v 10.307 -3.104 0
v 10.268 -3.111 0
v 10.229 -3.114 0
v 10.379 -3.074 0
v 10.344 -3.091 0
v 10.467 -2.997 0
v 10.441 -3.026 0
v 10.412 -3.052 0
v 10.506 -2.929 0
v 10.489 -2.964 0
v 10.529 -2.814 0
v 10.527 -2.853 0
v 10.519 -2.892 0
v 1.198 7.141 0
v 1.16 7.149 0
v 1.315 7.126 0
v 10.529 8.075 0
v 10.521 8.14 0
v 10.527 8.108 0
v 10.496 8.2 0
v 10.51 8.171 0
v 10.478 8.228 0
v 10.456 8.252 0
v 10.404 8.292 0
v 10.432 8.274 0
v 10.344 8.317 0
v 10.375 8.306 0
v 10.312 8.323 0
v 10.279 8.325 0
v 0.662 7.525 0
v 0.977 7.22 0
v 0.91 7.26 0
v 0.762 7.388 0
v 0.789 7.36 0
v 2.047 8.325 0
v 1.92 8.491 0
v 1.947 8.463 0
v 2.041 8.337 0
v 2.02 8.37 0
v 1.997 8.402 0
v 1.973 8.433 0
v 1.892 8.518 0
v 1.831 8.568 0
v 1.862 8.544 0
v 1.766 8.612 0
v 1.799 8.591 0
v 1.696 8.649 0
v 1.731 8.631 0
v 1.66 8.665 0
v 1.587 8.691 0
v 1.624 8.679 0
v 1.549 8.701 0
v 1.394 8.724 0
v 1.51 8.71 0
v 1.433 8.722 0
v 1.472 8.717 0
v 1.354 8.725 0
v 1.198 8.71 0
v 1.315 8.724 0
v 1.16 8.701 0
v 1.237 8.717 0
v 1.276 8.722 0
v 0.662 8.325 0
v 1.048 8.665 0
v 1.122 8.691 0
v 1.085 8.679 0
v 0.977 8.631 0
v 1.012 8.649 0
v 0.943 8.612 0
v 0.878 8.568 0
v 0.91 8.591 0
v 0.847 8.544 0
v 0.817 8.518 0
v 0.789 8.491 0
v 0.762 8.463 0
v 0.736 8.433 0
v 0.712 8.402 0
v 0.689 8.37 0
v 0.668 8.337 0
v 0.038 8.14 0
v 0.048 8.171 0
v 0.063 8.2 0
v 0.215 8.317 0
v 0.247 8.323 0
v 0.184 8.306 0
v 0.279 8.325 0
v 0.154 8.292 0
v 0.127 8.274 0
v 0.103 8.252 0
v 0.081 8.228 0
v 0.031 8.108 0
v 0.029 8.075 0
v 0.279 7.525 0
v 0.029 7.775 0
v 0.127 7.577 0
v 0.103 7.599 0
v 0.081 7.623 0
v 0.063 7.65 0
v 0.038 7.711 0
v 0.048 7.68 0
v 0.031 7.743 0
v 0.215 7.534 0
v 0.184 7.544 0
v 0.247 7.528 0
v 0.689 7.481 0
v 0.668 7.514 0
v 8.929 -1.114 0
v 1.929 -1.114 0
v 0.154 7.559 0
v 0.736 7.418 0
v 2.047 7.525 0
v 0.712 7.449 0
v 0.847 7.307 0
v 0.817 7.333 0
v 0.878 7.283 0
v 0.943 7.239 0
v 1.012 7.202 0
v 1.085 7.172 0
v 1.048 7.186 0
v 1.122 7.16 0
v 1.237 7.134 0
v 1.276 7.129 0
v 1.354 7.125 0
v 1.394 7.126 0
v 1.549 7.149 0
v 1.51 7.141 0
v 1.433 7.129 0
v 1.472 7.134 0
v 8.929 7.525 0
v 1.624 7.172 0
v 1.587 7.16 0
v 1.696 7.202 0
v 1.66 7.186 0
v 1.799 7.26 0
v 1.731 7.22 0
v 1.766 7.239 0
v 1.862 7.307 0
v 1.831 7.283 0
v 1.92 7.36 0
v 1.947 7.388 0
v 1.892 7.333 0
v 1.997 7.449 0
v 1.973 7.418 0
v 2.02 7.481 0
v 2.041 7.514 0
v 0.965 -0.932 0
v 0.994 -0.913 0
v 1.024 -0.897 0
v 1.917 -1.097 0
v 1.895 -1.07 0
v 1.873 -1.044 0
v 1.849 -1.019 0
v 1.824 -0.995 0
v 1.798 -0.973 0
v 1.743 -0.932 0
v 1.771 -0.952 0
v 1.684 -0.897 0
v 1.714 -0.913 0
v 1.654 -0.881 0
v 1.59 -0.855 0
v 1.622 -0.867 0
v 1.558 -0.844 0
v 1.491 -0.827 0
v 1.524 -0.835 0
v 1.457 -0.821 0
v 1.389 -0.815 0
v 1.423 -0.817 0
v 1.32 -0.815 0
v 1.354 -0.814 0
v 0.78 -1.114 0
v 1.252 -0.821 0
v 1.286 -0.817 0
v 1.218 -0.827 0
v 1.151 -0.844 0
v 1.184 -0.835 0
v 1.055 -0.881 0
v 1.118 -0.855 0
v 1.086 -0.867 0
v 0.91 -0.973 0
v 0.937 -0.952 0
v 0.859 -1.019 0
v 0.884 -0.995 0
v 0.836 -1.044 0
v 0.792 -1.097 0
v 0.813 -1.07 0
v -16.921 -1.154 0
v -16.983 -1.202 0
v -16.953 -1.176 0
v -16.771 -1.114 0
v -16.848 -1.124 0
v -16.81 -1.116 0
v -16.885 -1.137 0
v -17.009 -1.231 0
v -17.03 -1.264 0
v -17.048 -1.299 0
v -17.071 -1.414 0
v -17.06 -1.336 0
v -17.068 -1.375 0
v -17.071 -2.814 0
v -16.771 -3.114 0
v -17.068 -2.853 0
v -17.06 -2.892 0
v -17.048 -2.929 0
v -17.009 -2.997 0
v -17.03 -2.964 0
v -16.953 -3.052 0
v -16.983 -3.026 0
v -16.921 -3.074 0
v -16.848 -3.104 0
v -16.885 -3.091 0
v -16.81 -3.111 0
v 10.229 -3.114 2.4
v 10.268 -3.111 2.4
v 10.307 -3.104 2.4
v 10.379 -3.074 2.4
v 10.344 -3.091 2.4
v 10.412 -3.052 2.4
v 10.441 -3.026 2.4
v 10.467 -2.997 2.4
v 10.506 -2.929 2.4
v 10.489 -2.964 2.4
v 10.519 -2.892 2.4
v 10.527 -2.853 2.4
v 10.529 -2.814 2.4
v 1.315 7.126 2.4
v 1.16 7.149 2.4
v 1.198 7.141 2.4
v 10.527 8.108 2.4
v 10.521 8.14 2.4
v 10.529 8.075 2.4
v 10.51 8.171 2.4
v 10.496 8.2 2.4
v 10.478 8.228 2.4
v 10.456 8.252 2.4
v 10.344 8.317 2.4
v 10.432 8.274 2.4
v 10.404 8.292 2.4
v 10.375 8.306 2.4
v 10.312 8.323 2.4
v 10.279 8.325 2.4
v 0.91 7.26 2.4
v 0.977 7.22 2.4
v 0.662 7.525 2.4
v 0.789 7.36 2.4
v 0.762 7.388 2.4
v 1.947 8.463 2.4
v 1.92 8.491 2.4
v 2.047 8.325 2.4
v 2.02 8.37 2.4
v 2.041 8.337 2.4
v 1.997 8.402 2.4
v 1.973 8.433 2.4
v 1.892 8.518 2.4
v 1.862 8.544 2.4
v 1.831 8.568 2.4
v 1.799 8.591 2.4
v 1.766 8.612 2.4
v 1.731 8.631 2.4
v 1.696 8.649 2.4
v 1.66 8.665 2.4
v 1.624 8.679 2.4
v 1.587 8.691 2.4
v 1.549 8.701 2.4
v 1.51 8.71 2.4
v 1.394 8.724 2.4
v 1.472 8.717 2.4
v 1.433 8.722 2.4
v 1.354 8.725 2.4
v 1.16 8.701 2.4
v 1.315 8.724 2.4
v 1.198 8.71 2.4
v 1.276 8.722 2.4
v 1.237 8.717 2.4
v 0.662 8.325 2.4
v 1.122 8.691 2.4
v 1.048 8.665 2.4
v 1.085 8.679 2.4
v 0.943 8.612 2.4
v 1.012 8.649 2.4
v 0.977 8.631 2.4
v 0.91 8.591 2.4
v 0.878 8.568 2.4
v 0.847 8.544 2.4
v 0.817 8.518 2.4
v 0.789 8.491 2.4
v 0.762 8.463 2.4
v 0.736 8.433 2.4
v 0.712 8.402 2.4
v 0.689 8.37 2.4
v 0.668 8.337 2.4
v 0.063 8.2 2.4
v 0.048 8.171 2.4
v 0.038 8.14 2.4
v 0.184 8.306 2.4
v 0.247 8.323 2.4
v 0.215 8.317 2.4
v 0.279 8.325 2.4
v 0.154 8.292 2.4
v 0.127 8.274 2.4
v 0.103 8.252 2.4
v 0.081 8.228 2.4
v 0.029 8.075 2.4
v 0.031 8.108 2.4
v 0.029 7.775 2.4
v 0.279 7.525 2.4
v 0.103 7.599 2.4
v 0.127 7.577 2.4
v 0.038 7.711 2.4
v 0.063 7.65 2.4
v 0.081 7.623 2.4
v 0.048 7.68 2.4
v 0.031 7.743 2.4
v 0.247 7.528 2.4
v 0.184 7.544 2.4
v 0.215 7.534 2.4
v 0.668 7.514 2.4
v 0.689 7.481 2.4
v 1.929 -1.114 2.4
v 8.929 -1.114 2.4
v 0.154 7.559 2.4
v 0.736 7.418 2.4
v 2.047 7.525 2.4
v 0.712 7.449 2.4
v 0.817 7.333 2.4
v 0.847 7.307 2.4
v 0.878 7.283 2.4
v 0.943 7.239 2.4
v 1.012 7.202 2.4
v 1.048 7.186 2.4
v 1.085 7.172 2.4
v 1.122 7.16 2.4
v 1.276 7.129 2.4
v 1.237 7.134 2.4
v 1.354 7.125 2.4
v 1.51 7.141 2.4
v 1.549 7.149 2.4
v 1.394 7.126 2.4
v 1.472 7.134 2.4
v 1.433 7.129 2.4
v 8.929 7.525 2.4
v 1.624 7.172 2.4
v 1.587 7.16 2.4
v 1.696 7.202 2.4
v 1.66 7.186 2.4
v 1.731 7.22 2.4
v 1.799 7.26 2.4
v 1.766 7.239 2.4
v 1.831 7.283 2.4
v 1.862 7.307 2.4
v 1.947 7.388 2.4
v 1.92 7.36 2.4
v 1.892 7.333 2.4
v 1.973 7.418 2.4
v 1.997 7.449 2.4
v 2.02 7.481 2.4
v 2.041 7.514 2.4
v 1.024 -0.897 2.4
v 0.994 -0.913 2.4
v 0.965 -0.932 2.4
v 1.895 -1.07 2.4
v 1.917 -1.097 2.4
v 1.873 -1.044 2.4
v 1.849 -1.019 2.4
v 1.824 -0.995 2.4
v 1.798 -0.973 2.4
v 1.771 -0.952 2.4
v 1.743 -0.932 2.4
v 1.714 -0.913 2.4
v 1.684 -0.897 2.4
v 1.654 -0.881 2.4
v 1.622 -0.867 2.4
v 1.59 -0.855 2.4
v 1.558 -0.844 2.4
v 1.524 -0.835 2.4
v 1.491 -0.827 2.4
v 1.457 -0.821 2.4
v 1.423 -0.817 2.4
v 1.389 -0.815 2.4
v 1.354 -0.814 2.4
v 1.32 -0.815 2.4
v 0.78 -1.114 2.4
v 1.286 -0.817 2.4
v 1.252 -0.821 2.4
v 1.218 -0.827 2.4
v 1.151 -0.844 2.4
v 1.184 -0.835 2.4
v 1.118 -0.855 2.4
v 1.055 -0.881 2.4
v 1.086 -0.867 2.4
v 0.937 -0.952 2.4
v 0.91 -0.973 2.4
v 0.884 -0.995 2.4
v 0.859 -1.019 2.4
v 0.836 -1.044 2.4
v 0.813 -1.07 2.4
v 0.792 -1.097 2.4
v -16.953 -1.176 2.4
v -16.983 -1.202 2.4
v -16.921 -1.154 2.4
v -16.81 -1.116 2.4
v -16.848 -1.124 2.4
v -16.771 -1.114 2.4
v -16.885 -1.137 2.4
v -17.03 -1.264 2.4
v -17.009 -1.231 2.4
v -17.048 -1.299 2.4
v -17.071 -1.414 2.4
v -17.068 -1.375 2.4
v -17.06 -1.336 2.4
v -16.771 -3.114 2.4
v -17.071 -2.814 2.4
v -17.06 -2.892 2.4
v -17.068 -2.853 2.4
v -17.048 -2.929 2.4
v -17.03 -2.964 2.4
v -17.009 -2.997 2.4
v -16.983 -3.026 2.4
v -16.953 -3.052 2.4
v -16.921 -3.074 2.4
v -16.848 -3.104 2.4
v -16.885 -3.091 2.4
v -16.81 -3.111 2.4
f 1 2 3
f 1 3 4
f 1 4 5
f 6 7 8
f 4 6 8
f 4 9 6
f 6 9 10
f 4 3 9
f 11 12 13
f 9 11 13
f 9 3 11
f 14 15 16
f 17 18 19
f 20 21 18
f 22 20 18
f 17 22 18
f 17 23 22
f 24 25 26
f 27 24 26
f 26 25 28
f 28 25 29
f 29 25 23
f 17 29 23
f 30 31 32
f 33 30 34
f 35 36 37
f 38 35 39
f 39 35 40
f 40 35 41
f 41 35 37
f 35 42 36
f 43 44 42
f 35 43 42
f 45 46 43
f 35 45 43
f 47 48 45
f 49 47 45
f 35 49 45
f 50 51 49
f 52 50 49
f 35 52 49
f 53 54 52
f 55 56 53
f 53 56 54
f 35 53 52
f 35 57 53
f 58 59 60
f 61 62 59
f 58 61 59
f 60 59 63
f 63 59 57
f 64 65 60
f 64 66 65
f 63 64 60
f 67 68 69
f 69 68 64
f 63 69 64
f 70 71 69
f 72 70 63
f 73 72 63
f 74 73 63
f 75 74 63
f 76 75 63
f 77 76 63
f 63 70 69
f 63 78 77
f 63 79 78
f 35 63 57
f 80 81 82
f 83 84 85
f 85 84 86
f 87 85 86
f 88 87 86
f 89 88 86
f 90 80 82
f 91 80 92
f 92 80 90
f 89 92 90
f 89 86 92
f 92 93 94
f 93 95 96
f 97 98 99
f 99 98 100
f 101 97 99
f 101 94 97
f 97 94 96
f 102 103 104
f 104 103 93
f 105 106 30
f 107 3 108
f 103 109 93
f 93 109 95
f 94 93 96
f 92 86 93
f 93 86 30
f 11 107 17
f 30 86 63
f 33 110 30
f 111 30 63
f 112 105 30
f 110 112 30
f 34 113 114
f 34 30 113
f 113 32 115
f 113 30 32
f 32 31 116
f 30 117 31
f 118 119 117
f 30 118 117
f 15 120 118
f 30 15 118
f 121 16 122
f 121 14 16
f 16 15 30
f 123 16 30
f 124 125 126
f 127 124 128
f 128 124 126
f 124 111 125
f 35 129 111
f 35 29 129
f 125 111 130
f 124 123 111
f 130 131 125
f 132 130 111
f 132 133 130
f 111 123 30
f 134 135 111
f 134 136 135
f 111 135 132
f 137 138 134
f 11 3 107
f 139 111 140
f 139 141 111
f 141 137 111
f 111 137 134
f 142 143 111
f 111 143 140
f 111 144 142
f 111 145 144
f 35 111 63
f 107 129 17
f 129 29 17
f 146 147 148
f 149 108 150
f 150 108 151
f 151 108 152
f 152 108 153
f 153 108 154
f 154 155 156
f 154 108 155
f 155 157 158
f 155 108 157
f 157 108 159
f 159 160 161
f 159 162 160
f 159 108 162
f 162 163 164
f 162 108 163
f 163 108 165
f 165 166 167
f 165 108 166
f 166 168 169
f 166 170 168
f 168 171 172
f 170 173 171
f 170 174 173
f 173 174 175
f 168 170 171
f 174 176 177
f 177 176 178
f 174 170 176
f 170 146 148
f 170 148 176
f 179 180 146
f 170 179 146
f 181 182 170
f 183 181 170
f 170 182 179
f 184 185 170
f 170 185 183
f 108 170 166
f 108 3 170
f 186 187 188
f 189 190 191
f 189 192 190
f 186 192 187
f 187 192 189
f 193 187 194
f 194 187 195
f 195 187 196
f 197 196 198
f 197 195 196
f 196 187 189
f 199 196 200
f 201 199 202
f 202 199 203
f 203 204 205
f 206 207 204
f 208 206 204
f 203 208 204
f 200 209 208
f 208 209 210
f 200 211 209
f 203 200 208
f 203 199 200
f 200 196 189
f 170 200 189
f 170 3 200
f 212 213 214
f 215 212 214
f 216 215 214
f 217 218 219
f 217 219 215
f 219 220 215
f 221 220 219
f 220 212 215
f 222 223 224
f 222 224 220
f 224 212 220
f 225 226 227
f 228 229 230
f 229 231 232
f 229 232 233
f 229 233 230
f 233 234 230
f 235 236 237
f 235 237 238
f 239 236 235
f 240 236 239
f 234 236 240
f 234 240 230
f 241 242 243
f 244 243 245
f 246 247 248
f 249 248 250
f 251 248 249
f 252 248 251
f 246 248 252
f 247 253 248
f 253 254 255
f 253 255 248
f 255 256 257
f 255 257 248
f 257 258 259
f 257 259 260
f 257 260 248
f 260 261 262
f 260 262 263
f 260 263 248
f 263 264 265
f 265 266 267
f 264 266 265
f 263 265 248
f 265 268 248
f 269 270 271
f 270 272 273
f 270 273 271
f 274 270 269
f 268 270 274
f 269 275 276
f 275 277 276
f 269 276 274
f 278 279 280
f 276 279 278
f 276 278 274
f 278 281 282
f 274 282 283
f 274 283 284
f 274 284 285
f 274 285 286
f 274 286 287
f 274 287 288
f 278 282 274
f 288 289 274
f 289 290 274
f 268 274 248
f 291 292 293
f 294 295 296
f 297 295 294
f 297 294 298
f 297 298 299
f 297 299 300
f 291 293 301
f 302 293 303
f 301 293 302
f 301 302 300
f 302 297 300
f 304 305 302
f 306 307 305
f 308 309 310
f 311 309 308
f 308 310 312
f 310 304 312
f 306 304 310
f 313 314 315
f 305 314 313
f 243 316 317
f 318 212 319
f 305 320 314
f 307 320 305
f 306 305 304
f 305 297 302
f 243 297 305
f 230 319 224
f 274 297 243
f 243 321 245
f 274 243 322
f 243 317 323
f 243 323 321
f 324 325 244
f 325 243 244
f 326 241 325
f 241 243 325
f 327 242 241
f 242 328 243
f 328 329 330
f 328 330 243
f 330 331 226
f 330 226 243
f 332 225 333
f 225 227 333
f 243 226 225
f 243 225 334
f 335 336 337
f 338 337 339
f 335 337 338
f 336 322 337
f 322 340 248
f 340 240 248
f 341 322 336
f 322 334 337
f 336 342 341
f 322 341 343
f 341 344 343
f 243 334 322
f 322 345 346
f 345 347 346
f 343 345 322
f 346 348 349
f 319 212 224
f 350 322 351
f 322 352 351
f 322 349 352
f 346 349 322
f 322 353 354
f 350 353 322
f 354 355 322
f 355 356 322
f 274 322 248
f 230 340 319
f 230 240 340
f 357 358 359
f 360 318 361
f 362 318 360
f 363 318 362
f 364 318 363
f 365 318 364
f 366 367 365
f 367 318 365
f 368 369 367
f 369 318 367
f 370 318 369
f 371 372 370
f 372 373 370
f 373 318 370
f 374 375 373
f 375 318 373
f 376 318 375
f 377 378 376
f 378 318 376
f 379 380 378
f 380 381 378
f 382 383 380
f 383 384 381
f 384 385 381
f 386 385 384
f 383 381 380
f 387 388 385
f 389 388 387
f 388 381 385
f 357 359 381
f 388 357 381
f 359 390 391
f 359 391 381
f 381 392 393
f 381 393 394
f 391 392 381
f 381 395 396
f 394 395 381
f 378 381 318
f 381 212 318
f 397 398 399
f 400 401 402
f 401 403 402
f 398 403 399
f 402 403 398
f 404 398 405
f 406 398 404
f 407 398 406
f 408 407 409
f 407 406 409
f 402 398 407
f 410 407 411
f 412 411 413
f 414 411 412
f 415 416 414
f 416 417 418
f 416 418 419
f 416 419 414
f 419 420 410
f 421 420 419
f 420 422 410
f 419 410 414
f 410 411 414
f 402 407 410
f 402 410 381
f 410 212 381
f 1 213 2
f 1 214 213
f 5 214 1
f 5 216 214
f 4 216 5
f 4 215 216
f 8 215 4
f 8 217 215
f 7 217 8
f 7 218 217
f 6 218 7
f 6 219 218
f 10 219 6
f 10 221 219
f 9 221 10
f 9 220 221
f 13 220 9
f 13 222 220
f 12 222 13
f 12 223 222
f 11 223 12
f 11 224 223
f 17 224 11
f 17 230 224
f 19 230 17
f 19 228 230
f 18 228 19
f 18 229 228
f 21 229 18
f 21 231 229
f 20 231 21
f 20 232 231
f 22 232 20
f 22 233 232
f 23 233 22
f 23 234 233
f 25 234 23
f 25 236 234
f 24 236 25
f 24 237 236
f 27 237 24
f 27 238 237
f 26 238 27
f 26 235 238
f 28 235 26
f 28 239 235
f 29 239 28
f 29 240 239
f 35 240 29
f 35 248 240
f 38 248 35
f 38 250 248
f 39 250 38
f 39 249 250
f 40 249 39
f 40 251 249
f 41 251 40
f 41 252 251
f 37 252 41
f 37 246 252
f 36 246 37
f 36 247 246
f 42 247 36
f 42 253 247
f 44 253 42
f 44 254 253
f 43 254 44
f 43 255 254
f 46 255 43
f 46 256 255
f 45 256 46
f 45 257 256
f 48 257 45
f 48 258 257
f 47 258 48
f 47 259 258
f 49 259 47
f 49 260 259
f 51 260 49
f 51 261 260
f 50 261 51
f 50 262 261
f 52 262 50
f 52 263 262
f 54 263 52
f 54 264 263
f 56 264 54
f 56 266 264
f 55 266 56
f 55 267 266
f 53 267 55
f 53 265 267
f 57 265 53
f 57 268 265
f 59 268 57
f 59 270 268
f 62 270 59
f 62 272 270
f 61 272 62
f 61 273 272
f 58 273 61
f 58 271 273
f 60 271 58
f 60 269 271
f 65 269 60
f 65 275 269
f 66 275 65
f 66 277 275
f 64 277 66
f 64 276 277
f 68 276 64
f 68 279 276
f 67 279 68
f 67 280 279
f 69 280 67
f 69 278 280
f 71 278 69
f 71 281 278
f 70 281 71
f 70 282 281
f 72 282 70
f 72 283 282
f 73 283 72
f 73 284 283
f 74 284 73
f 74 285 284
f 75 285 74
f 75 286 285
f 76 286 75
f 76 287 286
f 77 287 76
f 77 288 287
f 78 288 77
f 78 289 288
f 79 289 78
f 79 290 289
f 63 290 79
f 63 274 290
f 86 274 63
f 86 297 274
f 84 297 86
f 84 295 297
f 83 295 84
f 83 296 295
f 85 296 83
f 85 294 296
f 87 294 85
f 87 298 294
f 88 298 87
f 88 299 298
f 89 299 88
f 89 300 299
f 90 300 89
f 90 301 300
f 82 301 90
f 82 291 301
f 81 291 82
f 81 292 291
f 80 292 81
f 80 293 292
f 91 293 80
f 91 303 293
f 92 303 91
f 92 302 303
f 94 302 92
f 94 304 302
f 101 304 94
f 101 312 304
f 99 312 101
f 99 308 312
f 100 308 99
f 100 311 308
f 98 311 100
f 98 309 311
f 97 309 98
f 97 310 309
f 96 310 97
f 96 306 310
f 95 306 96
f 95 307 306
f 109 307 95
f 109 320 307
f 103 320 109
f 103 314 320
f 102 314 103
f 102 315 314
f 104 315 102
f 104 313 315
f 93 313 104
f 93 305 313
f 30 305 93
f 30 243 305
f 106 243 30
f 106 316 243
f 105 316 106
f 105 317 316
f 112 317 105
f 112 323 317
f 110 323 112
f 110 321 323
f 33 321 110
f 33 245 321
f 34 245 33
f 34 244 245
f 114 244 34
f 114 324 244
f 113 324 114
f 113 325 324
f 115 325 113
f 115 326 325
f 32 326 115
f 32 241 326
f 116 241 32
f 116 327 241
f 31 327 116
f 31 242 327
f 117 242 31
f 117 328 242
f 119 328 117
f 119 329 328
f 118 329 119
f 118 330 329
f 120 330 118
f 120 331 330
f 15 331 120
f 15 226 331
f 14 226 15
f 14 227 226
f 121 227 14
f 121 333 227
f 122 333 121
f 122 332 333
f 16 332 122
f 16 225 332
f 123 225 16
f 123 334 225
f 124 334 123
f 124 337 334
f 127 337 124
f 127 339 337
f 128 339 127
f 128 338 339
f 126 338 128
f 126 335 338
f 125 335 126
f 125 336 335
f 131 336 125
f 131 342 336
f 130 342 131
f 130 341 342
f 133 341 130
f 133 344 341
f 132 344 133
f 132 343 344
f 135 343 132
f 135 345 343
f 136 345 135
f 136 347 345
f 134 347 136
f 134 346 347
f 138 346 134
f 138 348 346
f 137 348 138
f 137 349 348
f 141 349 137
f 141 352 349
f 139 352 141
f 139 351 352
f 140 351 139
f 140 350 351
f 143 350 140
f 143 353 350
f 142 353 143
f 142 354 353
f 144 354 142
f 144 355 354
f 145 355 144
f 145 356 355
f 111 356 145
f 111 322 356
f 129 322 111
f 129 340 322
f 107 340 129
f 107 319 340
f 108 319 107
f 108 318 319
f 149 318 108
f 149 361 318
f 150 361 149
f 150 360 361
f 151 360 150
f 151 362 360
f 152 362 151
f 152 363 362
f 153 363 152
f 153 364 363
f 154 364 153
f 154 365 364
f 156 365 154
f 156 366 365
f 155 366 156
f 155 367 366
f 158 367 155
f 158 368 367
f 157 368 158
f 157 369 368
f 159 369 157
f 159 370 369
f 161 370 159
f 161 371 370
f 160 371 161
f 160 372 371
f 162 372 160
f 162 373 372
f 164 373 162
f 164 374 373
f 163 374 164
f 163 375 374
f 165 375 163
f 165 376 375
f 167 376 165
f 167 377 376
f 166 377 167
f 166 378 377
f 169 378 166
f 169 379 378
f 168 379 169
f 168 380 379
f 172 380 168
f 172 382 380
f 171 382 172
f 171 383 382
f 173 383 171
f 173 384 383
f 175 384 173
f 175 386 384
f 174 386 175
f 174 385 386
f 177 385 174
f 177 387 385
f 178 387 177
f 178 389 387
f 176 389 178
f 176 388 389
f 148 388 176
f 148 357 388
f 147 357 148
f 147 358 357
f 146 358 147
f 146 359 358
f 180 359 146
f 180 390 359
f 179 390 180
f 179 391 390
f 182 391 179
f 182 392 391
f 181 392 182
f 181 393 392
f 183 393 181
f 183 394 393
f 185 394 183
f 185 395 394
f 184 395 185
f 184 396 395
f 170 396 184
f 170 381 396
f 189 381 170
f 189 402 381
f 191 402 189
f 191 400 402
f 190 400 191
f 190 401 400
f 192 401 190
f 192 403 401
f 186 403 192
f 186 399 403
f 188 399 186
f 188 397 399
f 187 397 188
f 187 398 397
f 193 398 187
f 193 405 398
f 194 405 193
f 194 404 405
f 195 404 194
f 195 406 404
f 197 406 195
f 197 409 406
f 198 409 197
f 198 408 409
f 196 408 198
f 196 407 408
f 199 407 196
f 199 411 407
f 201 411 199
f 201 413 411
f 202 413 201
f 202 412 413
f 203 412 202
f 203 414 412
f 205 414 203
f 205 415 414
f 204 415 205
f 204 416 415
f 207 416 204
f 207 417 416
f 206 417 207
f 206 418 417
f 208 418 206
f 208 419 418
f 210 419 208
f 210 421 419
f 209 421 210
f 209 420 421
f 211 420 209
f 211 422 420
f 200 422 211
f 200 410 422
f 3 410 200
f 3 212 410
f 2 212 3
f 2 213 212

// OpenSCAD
// Perfil C em PC. Imprimir deitado de lado: sem suportes.
// Rebaixo livre 0.15 mm menor que o conjunto nominal; folhas flexionam ao encaixar.
linear_extrude(height=2.4) polygon(points=[[-16.809825, -3.11135], [-16.770667, -3.113917], [9.279333, -3.113917], [10.179333, -3.113917], [10.229333, -3.113917], [10.26849, -3.11135], [10.306978, -3.103694], [10.344138, -3.091081], [10.379333, -3.073724], [10.411961, -3.051923], [10.441465, -3.026049], [10.467339, -2.996545], [10.48914, -2.963917], [10.506496, -2.928722], [10.51911, -2.891562], [10.526766, -2.853074], [10.529333, -2.813917], [10.529333, -2.763917], [10.529333, -1.413917], [10.529333, 7.775417], [10.529333, 7.975417], [10.529333, 8.075417], [10.527194, 8.108048], [10.520814, 8.140121], [10.510302, 8.171088], [10.495839, 8.200417], [10.477671, 8.227607], [10.456109, 8.252193], [10.431523, 8.273755], [10.404333, 8.291923], [10.375003, 8.306387], [10.344037, 8.316898], [10.311964, 8.323278], [10.279333, 8.325417], [10.179333, 8.325417], [9.279333, 8.325417], [2.046907, 8.325417], [2.040515, 8.336699], [2.019508, 8.369873], [1.996899, 8.401976], [1.972741, 8.432931], [1.947093, 8.462664], [1.920018, 8.491102], [1.89158, 8.518178], [1.861847, 8.543825], [1.830892, 8.567983], [1.798789, 8.590592], [1.765615, 8.6116], [1.73145, 8.630954], [1.696377, 8.648608], [1.660479, 8.66452], [1.623844, 8.678652], [1.58656, 8.690969], [1.548717, 8.701442], [1.510405, 8.710045], [1.471717, 8.716758], [1.432746, 8.721565], [1.393587, 8.724453], [1.354333, 8.725417], [1.315078, 8.724453], [1.275919, 8.721565], [1.236948, 8.716758], [1.19826, 8.710045], [1.159948, 8.701442], [1.122105, 8.690969], [1.084821, 8.678652], [1.048186, 8.66452], [1.012288, 8.648608], [0.977215, 8.630954], [0.94305, 8.6116], [0.909876, 8.590592], [0.877773, 8.567983], [0.846818, 8.543825], [0.817085, 8.518178], [0.788647, 8.491102], [0.761572, 8.462664], [0.735924, 8.432931], [0.711766, 8.401976], [0.689157, 8.369873], [0.66815, 8.336699], [0.661758, 8.325417], [0.279333, 8.325417], [0.246701, 8.323278], [0.214628, 8.316898], [0.183662, 8.306387], [0.154333, 8.291923], [0.127142, 8.273755], [0.102556, 8.252193], [0.080994, 8.227607], [0.062826, 8.200417], [0.048363, 8.171088], [0.037851, 8.140121], [0.031471, 8.108048], [0.029333, 8.075417], [0.029333, 7.775417], [0.031471, 7.742785], [0.037851, 7.710712], [0.048363, 7.679746], [0.062826, 7.650417], [0.080994, 7.623226], [0.102556, 7.59864], [0.127142, 7.577078], [0.154333, 7.55891], [0.183662, 7.544447], [0.214628, 7.533935], [0.246701, 7.527556], [0.279333, 7.525417], [0.661758, 7.525417], [0.66815, 7.514135], [0.689157, 7.480961], [0.711766, 7.448857], [0.735924, 7.417902], [0.761572, 7.38817], [0.788647, 7.359731], [0.817085, 7.332656], [0.846818, 7.307008], [0.877773, 7.282851], [0.909876, 7.260241], [0.94305, 7.239234], [0.977215, 7.21988], [1.012288, 7.202225], [1.048186, 7.186313], [1.084821, 7.172181], [1.122105, 7.159864], [1.159948, 7.149392], [1.19826, 7.140788], [1.236948, 7.134076], [1.275919, 7.129269], [1.315078, 7.12638], [1.354333, 7.125417], [1.393587, 7.12638], [1.432746, 7.129269], [1.471717, 7.134076], [1.510405, 7.140788], [1.548717, 7.149392], [1.58656, 7.159864], [1.623844, 7.172181], [1.660479, 7.186313], [1.696377, 7.202225], [1.73145, 7.21988], [1.765615, 7.239234], [1.798789, 7.260241], [1.830892, 7.282851], [1.861847, 7.307008], [1.89158, 7.332656], [1.920018, 7.359731], [1.947093, 7.38817], [1.972741, 7.417902], [1.996899, 7.448857], [2.019508, 7.480961], [2.040515, 7.514135], [2.046907, 7.525417], [8.929333, 7.525417], [8.929333, -1.113917], [1.928543, -1.113917], [1.916578, -1.096927], [1.89544, -1.069841], [1.872998, -1.043825], [1.849307, -1.018942], [1.824424, -0.995251], [1.798408, -0.972809], [1.771322, -0.951671], [1.743232, -0.931888], [1.714204, -0.913507], [1.68431, -0.896572], [1.653621, -0.881124], [1.622211, -0.867201], [1.590155, -0.854836], [1.557532, -0.844058], [1.524419, -0.834895], [1.490896, -0.827367], [1.457044, -0.821493], [1.422945, -0.817287], [1.38868, -0.81476], [1.354333, -0.813917], [1.319985, -0.81476], [1.285721, -0.817287], [1.251621, -0.821493], [1.217769, -0.827367], [1.184246, -0.834895], [1.151133, -0.844058], [1.11851, -0.854836], [1.086454, -0.867201], [1.055044, -0.881124], [1.024355, -0.896572], [0.994461, -0.913507], [0.965433, -0.931888], [0.937343, -0.951671], [0.910257, -0.972809], [0.884241, -0.995251], [0.859358, -1.018942], [0.835667, -1.043825], [0.813225, -1.069841], [0.792087, -1.096927], [0.780122, -1.113917], [-16.770667, -1.113917], [-16.809825, -1.116483], [-16.848313, -1.124139], [-16.885473, -1.136753], [-16.920667, -1.154109], [-16.953296, -1.175911], [-16.9828, -1.201785], [-17.008673, -1.231288], [-17.030475, -1.263917], [-17.047831, -1.299112], [-17.060445, -1.336271], [-17.068101, -1.374759], [-17.070667, -1.413917], [-17.070667, -2.813917], [-17.068101, -2.853074], [-17.060445, -2.891562], [-17.047831, -2.928722], [-17.030475, -2.963917], [-17.008673, -2.996545], [-16.9828, -3.026049], [-16.953296, -3.051923], [-16.920667, -3.073724], [-16.885473, -3.091081], [-16.848313, -3.103694]]);
